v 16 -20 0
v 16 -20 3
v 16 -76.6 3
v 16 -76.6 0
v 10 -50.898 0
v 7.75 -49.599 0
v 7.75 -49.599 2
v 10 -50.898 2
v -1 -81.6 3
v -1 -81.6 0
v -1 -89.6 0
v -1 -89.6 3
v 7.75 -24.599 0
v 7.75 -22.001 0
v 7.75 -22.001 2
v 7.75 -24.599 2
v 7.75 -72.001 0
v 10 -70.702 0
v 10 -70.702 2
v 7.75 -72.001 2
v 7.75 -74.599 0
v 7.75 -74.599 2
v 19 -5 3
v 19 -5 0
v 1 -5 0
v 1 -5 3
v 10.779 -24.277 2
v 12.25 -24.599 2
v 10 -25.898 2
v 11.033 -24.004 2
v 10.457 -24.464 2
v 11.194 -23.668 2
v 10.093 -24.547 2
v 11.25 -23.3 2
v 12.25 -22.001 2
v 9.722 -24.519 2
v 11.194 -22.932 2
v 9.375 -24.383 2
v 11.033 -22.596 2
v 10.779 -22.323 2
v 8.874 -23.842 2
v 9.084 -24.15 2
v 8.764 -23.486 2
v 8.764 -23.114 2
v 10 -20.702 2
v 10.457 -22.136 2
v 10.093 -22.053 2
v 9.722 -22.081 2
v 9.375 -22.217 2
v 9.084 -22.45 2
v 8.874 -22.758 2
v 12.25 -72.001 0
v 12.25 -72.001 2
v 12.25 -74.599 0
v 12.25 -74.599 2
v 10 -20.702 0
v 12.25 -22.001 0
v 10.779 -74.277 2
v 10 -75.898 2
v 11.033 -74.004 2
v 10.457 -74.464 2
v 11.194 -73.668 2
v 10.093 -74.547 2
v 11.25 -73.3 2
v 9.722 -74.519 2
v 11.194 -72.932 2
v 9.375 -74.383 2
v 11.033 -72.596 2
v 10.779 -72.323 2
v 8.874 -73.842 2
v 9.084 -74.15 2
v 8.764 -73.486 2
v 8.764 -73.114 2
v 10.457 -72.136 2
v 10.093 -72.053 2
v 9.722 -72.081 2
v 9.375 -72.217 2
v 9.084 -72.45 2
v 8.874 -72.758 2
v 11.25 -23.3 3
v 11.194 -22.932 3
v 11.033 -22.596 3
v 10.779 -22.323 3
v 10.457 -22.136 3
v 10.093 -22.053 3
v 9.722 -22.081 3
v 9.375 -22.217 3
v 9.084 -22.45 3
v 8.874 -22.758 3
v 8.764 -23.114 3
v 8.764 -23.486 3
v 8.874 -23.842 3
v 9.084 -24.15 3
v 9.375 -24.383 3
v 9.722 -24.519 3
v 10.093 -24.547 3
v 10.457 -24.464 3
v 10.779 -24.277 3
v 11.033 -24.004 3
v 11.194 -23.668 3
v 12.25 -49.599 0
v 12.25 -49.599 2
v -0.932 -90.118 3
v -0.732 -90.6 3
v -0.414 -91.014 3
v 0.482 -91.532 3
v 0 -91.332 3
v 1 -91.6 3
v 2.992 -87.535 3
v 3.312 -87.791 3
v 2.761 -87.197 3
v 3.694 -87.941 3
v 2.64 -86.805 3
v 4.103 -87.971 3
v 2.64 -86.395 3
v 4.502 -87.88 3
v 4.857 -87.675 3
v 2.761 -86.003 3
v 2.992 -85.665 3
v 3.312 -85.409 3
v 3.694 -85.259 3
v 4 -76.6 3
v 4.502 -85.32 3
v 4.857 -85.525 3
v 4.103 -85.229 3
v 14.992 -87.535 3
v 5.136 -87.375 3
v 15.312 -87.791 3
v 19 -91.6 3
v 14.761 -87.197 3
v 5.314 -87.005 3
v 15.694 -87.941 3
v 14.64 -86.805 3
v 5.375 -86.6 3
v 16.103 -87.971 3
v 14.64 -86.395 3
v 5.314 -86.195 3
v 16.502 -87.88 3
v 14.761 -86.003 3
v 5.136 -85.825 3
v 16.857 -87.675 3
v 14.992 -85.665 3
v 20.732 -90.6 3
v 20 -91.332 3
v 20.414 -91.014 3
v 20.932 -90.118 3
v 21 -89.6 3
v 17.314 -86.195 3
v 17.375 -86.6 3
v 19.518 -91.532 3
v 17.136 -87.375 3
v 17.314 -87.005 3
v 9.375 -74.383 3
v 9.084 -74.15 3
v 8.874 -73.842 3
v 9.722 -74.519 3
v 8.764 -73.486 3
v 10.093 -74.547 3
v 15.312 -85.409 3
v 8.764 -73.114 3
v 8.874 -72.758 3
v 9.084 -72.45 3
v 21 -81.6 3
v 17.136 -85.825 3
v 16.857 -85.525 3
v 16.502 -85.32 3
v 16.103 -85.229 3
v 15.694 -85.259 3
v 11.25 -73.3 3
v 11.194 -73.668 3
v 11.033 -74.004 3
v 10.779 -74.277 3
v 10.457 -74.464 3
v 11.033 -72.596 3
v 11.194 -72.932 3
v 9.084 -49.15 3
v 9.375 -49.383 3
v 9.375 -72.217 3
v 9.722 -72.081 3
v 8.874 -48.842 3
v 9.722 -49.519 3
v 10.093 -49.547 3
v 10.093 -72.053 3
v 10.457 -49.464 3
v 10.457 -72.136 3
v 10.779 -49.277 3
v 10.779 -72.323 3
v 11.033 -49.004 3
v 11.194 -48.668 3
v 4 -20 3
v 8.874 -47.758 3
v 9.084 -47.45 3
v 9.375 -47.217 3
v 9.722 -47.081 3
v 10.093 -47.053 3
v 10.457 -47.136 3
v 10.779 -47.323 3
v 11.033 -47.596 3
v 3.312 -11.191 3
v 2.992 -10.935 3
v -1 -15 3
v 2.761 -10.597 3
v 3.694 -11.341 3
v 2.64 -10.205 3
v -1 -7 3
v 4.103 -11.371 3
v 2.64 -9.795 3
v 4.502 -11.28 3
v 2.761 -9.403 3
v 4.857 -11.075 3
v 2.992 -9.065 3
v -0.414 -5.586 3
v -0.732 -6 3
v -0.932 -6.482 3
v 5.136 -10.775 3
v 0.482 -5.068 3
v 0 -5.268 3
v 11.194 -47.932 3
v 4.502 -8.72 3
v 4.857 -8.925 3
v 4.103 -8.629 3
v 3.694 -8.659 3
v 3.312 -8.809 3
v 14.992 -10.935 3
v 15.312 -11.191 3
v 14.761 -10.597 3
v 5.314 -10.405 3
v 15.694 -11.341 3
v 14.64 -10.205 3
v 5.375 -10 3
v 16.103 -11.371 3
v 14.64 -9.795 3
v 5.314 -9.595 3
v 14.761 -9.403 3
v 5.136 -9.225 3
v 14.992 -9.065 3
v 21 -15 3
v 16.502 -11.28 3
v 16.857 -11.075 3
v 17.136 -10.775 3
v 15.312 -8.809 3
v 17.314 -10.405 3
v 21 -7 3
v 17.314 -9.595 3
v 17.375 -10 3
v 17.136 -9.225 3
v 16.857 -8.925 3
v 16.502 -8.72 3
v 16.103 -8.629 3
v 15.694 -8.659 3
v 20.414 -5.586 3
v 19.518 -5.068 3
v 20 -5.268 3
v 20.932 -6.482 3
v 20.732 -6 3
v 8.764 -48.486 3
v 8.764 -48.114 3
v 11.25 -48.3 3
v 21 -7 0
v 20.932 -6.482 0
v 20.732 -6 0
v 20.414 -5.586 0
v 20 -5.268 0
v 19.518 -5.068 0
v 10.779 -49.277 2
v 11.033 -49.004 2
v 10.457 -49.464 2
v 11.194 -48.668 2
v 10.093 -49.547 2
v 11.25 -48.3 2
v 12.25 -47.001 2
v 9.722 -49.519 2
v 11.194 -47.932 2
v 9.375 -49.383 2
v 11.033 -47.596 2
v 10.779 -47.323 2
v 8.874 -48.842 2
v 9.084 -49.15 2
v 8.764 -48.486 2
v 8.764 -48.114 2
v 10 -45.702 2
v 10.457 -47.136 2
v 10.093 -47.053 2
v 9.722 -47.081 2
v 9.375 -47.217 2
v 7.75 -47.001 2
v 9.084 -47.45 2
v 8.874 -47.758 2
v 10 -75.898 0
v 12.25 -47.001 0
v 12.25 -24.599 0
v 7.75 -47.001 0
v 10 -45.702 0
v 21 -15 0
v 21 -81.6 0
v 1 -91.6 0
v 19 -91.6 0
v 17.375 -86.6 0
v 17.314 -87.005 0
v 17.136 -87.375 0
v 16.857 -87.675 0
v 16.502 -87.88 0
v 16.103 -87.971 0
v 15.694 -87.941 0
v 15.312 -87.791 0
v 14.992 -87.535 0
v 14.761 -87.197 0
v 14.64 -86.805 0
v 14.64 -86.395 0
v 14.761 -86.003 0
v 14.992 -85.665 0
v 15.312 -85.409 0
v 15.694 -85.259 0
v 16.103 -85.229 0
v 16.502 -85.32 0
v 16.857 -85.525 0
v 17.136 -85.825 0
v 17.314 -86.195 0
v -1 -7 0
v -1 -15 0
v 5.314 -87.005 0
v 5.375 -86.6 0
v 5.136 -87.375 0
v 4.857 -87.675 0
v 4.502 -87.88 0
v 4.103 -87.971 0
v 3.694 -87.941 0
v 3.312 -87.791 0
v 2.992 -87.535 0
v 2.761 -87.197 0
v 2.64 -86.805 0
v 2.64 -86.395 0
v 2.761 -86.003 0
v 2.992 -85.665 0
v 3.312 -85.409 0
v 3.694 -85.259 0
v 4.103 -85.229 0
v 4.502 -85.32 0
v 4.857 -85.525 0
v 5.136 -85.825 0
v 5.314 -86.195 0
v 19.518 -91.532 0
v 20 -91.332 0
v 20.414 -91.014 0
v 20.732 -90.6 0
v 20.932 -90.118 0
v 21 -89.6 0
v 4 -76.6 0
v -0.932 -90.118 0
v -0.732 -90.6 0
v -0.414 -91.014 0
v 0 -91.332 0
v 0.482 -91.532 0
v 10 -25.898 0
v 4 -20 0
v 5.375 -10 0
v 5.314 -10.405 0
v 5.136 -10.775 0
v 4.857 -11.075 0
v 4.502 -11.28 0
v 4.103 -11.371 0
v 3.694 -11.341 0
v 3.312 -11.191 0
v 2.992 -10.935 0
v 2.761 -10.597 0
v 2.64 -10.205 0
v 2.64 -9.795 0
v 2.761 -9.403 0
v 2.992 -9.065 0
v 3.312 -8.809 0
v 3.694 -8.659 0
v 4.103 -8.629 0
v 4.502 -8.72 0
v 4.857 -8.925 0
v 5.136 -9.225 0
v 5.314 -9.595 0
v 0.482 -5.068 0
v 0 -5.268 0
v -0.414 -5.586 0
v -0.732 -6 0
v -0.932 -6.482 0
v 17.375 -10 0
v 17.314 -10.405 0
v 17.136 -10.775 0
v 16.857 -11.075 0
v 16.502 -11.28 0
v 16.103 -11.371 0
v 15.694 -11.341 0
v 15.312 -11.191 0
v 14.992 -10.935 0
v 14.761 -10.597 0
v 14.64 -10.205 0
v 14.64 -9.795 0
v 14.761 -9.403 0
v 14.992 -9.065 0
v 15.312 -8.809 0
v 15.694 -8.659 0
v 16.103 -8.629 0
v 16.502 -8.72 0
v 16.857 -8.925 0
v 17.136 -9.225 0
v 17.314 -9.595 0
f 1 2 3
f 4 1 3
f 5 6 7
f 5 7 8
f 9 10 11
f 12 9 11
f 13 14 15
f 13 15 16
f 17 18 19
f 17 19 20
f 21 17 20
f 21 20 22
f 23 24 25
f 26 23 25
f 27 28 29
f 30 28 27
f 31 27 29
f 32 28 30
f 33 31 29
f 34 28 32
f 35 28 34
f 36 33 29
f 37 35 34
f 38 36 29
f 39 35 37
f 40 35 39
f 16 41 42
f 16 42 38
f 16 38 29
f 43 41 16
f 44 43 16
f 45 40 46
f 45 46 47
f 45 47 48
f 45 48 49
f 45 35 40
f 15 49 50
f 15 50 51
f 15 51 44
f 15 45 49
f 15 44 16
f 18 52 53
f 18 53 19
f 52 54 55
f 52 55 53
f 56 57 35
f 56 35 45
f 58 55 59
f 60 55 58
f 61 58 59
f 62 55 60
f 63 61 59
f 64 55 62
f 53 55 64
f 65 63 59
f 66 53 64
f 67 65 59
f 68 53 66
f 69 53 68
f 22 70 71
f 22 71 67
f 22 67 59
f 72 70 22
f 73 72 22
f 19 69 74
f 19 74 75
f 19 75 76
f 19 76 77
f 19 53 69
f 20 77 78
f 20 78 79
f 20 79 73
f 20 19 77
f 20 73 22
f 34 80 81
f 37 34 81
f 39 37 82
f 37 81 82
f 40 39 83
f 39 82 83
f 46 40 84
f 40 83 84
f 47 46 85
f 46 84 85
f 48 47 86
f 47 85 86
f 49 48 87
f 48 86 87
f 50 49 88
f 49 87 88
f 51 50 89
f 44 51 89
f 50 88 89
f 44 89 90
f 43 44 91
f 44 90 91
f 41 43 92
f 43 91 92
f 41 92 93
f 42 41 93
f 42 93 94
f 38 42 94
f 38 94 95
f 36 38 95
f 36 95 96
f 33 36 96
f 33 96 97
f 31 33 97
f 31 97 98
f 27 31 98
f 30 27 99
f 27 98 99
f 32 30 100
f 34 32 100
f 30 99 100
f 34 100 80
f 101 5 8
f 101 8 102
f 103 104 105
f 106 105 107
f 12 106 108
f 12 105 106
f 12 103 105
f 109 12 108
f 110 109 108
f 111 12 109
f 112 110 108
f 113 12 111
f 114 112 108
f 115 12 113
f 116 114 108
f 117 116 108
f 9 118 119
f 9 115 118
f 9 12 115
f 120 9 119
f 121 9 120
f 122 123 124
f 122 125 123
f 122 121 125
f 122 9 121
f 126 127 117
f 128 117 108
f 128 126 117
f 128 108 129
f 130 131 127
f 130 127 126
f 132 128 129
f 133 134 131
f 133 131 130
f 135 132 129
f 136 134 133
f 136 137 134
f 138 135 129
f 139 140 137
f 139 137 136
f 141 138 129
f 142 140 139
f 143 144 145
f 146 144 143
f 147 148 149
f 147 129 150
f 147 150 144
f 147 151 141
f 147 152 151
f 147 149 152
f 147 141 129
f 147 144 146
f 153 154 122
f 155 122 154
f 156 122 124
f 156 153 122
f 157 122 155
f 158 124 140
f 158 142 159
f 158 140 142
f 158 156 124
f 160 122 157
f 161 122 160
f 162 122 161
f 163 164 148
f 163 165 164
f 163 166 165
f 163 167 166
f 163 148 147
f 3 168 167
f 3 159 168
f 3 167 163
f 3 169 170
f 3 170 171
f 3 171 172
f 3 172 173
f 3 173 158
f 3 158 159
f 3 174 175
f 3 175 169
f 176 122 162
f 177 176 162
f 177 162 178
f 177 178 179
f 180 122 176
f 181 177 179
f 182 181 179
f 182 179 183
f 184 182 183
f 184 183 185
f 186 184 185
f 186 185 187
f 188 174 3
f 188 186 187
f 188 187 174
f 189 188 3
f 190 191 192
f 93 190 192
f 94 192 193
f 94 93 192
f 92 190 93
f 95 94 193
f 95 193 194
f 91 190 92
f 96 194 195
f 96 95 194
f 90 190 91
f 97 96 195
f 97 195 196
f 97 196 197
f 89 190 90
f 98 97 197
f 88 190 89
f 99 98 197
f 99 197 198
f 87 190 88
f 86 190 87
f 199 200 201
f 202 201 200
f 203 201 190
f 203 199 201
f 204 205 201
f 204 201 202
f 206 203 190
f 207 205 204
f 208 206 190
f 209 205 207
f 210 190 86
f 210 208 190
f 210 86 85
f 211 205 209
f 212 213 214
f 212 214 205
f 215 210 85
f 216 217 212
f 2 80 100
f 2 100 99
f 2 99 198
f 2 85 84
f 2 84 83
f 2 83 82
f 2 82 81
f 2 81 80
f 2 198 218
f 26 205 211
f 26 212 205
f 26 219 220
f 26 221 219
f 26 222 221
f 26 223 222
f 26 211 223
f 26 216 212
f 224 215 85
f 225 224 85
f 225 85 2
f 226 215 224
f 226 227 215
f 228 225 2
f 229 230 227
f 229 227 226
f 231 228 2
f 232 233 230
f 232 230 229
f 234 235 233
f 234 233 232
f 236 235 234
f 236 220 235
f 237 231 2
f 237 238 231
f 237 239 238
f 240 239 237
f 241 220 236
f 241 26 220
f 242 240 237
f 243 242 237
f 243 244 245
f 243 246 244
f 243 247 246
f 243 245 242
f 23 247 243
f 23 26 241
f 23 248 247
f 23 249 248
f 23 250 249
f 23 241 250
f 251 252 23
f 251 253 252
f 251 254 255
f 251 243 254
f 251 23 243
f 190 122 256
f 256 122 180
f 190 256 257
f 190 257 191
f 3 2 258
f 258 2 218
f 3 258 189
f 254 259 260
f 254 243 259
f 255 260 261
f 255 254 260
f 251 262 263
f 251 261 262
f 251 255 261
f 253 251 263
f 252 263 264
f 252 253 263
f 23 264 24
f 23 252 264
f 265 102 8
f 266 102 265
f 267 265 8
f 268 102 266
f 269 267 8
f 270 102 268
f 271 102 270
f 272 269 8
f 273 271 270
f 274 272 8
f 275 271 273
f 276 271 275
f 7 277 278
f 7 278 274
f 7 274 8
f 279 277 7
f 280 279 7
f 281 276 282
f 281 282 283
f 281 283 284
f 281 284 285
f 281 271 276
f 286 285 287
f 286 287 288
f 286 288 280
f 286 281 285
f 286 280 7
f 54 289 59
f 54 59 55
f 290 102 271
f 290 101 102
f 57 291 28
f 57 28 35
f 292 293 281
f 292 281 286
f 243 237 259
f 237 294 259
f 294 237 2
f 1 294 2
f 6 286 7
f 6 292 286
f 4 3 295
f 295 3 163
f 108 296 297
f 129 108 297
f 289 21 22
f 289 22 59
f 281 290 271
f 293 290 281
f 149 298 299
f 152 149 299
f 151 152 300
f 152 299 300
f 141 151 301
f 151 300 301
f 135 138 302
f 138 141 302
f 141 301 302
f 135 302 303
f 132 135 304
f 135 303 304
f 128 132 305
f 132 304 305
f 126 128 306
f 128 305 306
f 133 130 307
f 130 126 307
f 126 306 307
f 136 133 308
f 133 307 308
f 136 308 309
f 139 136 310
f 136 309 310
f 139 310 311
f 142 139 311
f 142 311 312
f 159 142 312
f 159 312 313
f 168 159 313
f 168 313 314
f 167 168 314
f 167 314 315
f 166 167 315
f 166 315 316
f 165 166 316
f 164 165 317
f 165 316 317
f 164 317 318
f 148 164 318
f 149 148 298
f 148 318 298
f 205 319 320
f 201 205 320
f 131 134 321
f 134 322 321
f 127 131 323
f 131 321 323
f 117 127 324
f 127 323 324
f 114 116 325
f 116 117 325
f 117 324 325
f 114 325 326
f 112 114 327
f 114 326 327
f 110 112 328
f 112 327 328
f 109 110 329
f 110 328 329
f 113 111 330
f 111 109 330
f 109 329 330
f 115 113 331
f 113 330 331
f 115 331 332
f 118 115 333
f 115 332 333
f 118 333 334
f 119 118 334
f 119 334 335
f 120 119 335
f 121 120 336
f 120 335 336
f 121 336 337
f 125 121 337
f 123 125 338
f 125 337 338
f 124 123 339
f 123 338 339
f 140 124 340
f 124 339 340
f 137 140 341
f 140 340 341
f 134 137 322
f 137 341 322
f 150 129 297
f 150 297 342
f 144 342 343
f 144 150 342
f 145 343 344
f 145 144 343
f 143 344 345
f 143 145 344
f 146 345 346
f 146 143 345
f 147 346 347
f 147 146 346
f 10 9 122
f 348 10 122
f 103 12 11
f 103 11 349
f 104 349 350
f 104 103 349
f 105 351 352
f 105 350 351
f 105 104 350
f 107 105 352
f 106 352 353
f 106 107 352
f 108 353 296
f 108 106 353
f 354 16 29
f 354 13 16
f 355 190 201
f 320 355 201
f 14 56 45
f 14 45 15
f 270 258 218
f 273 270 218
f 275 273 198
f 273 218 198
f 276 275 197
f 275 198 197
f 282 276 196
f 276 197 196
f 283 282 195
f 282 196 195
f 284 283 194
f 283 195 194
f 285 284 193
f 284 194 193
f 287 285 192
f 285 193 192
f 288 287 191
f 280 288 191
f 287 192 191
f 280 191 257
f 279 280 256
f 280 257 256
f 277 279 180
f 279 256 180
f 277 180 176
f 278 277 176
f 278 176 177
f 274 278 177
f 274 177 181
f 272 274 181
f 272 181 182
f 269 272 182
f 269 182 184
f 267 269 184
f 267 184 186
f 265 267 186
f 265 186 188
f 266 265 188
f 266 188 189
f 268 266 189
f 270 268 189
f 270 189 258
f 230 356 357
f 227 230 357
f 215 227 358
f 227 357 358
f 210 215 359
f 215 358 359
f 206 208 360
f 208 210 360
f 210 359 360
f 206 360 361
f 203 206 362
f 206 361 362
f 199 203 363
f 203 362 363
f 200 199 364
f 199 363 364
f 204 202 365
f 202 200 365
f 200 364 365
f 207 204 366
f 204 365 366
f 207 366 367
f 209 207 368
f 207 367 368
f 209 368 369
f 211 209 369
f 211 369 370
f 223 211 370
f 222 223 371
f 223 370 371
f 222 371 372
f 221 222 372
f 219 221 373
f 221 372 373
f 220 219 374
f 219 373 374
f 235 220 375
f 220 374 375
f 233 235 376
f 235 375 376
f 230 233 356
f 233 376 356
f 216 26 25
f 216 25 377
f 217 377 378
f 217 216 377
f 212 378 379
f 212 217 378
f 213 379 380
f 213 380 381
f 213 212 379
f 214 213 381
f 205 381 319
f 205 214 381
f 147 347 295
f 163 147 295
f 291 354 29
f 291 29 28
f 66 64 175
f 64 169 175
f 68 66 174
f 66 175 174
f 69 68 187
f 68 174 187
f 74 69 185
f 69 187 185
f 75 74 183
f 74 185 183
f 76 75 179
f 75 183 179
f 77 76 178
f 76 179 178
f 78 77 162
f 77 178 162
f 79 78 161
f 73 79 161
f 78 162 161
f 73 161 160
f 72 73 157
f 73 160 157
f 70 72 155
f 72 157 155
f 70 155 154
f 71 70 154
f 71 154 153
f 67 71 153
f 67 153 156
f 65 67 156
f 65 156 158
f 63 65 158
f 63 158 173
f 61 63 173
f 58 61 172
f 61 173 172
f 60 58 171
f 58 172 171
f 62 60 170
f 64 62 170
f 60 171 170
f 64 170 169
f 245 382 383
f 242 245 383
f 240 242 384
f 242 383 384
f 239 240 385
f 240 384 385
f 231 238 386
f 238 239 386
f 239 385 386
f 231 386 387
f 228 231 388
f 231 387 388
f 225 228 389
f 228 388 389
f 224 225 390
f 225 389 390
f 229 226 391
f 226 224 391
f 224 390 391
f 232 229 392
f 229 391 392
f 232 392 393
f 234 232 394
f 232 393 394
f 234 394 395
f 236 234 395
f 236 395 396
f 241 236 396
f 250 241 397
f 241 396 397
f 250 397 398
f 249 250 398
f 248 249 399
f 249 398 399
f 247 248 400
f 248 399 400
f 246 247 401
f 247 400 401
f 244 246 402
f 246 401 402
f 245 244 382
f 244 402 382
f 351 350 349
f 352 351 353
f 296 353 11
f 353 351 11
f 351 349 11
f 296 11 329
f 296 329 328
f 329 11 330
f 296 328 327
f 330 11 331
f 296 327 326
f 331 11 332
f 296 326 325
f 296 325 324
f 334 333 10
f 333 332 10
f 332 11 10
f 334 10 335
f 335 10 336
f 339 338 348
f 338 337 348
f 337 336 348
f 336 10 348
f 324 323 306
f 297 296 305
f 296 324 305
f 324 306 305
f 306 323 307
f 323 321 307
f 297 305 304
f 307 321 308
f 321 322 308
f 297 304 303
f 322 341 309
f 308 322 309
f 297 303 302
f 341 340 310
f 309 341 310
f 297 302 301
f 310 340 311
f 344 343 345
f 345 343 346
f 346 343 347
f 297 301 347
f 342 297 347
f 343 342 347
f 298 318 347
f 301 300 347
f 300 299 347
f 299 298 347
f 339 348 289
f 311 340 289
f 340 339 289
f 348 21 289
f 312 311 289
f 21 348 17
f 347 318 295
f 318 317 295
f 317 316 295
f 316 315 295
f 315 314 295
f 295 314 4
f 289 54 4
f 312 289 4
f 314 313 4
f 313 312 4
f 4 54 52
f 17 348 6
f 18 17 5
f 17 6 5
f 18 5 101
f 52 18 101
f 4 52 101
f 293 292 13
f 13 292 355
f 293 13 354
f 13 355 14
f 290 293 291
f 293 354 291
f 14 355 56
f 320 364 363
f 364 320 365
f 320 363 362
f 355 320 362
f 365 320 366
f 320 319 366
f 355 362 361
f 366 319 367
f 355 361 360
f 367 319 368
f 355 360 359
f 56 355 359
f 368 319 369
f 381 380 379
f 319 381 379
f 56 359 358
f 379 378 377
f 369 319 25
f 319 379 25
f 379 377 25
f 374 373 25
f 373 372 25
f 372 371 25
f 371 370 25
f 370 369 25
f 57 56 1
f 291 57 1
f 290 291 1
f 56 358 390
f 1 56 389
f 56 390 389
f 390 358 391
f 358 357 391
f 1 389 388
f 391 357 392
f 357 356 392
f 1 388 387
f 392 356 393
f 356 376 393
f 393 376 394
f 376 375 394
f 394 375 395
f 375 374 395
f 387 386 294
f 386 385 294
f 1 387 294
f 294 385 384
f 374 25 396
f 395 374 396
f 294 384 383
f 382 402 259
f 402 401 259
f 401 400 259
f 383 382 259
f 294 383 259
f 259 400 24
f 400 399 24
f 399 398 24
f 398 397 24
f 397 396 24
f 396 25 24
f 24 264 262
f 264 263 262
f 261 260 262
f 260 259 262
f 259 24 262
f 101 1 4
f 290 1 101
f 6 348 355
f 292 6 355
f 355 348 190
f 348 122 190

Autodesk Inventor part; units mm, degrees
ref_plane "YZ Plane" through (0, 0, 0) normal (1, 0, 0) x (0, 1, 0)
ref_plane "XZ Plane" through (0, 0, 0) normal (0, 1, 0) x (-1, 0, 0)
ref_plane "XY Plane" through (0, 0, 0) normal (0, 0, 1) x (1, 0, 0)
sketch "Sketch1" plane through (0, 0, 0) normal (0, 0, 1) x (1, 0, 0)
  line L0 (12.5, 0) -> (18.7, 0) construction
  line L1 (12.5, 0) -> (12.5, -92) construction
  line L2 (12.5, -92) -> (18.7, -92) construction
  line L3 (18.7, -90.35) -> (18.7, -92) construction
  line L4 (18.7, -90.35) -> (19, -90.0495) construction
  line L5 (19, -90.0495) -> (19, -83.1505) construction
  line L6 (19, -83.1505) -> (18.7, -82.85) construction
  line L7 (18.7, -13.75) -> (18.7, -82.85) construction
  line L8 (18.7, -13.75) -> (19, -13.4495) construction
  line L9 (19, -13.4495) -> (19, -6.5505) construction
  line L10 (19, -6.5505) -> (18.7, -6.25) construction
  line L11 (18.7, 0) -> (18.7, -6.25) construction
  circle A0 centre (16, -86.6) radius 1.25 construction
  circle A1 centre (16, -10) radius 1.25 construction
  line L12 (0.5, 0) -> (6.7, 0) construction
  line L13 (0.5, 0) -> (0.5, -92) construction
  line L14 (0.5, -92) -> (6.7, -92) construction
  line L15 (6.7, -90.35) -> (6.7, -92) construction
  line L16 (6.7, -90.35) -> (7, -90.0495) construction
  line L17 (7, -90.0495) -> (7, -83.1505) construction
  line L18 (7, -83.1505) -> (6.7, -82.85) construction
  line L19 (6.7, -13.75) -> (6.7, -82.85) construction
  line L20 (6.7, -13.75) -> (7, -13.4495) construction
  line L21 (7, -13.4495) -> (7, -6.5505) construction
  line L22 (7, -6.5505) -> (6.7, -6.25) construction
  line L23 (6.7, 0) -> (6.7, -6.25) construction
  circle A2 centre (4, -86.6) radius 1.25 construction
  circle A3 centre (4, -10) radius 1.25 construction
  circle A4 centre (4, -86.6) radius 1.375
  circle A5 centre (16, -86.6) radius 1.375
  circle A6 centre (16, -10) radius 1.375
  circle A7 centre (4, -10) radius 1.375
  line L24 (4, -86.6) -> (4, -10) construction
  line L25 (4, -10) -> (16, -10) construction
  line L26 (16, -10) -> (16, -86.6) construction
  line L27 (16, -86.6) -> (4, -86.6) construction
  line L28 (-1, -5) -> (-1, -91.6)
  line L29 (-1, -91.6) -> (21, -91.6)
  line L30 (21, -91.6) -> (21, -5)
  line L31 (21, -5) -> (-1, -5)
  point P0 (0, 0)
  dimension "d0" = 2.75
  dimension "d1" = 2.75
  dimension "d2" = 2.75
  dimension "d3" = 2.75
  dimension "d4" = 5
extrude "Extrusion1" add sketch "Sketch1" along normal blind 3
sketch "Sketch2" plane through (0, 0, 3) normal (0, 0, 1) x (1, 0, 0)
  line L0 (-1, -91.6) -> (21, -91.6) projected
  line L1 (21, -91.6) -> (21, -5) projected
  line L2 (21, -5) -> (-1, -5) projected
  line L3 (-1, -5) -> (-1, -91.6) projected
  circle A0 centre (4, -86.6) radius 1.375 projected
  circle A1 centre (16, -86.6) radius 1.375 projected
  circle A2 centre (16, -10) radius 1.375 projected
  circle A3 centre (4, -10) radius 1.375 projected
  line L4 (-1, -81.6) -> (4, -76.6)
  line L5 (4, -76.6) -> (4, -20)
  line L6 (4, -20) -> (-1, -15)
  point P0 (0, 0)
  dimension "d7" = 5
  dimension "d8" = 45
  dimension "d9" = 45
  dimension "d10" = 10
  dimension "d11" = 10
extrude "Extrusion2" cut sketch "Sketch2" against normal through all contours L3 L6 L5 L4
ref_plane "Work Plane1" through (10, -91.6, 0) normal (-1, 0, 0) x (0, 0, 1)
mirror "Mirror1" about plane through (10, -91.6, 0) normal (-1, 0, 0) of "Extrusion2"
sketch "Sketch3" plane through (0, 0, 3) normal (0, 0, 1) x (1, 0, 0)
  line L0 (16, -20) -> (21, -15) projected
  line L1 (21, -15) -> (21, -5) projected
  line L2 (21, -5) -> (-1, -5) projected
  line L3 (-1, -5) -> (-1, -15) projected
  line L4 (-1, -15) -> (4, -20) projected
  line L5 (4, -20) -> (4, -76.6) projected
  line L6 (4, -76.6) -> (-1, -81.6) projected
  line L7 (-1, -81.6) -> (-1, -91.6) projected
  line L8 (-1, -91.6) -> (21, -91.6) projected
  line L9 (21, -91.6) -> (21, -81.6) projected
  line L10 (21, -81.6) -> (16, -76.6) projected
  line L11 (16, -76.6) -> (16, -20) projected
  circle A0 centre (4, -86.6) radius 1.375 projected
  circle A1 centre (16, -86.6) radius 1.375 projected
  circle A2 centre (16, -10) radius 1.375 projected
  circle A3 centre (4, -10) radius 1.375 projected
  circle A4 centre (10, -48.3) radius 1.25
  line L12 (10, -91.6) -> (10, -48.3)
  line L13 (10, -48.3) -> (4, -48.3)
  point P0 (0, 0)
  dimension "d14" = 2.5
  dimension "d15" = 43.3
  dimension "d16" = 86.6
extrude "Extrusion3" cut sketch "Sketch3" against normal through all contours L12 L13 A4 | A4 L13 L12
sketch "Sketch4" plane through (0, 0, 0) normal (0, 0, -1) x (-1, 0, 0)
  circle A0 centre (-10, -48.3) radius 1.25 projected
  line L0 (-10, -50.8981) -> (-12.25, -49.599)
  line L1 (-12.25, -49.599) -> (-12.25, -47.001)
  line L2 (-12.25, -47.001) -> (-10, -45.7019)
  line L3 (-10, -45.7019) -> (-7.75, -47.001)
  line L4 (-7.75, -47.001) -> (-7.75, -49.599)
  line L5 (-7.75, -49.599) -> (-10, -50.8981)
  line L6 (-4, -76.6) -> (-4, -20) projected
  point P0 (0, 0)
  dimension "d19" = 4.5
extrude "Extrusion4" cut sketch "Sketch4" against normal blind 2 contours A0 | L0 L1 L2 L3 L4 L5
pattern_linear "Rectangular Pattern1" count 3 spacing 25 along (0, -1, 0) of "Extrusion3", "Extrusion4" first direction both ways yes
ref_plane "Work Plane2" through (-1, -48.3, 0) normal (0, 1, 0) x (1, 0, 0)
fillet "Fillet1" radius 2 4 edges at (-1, -91.6, 1.5) (21, -91.6, 1.5) (-1, -5, 1.5) (21, -5, 1.5)
equation "\"d1\" = d0"
equation "\"d2\" = d0"
equation "\"d3\" = d0"
equation "\"d9\" = d8"
equation "\"d11\" = d10"
equation "\"d15\" = 0.5 * d16"
properties part number "A-06"
